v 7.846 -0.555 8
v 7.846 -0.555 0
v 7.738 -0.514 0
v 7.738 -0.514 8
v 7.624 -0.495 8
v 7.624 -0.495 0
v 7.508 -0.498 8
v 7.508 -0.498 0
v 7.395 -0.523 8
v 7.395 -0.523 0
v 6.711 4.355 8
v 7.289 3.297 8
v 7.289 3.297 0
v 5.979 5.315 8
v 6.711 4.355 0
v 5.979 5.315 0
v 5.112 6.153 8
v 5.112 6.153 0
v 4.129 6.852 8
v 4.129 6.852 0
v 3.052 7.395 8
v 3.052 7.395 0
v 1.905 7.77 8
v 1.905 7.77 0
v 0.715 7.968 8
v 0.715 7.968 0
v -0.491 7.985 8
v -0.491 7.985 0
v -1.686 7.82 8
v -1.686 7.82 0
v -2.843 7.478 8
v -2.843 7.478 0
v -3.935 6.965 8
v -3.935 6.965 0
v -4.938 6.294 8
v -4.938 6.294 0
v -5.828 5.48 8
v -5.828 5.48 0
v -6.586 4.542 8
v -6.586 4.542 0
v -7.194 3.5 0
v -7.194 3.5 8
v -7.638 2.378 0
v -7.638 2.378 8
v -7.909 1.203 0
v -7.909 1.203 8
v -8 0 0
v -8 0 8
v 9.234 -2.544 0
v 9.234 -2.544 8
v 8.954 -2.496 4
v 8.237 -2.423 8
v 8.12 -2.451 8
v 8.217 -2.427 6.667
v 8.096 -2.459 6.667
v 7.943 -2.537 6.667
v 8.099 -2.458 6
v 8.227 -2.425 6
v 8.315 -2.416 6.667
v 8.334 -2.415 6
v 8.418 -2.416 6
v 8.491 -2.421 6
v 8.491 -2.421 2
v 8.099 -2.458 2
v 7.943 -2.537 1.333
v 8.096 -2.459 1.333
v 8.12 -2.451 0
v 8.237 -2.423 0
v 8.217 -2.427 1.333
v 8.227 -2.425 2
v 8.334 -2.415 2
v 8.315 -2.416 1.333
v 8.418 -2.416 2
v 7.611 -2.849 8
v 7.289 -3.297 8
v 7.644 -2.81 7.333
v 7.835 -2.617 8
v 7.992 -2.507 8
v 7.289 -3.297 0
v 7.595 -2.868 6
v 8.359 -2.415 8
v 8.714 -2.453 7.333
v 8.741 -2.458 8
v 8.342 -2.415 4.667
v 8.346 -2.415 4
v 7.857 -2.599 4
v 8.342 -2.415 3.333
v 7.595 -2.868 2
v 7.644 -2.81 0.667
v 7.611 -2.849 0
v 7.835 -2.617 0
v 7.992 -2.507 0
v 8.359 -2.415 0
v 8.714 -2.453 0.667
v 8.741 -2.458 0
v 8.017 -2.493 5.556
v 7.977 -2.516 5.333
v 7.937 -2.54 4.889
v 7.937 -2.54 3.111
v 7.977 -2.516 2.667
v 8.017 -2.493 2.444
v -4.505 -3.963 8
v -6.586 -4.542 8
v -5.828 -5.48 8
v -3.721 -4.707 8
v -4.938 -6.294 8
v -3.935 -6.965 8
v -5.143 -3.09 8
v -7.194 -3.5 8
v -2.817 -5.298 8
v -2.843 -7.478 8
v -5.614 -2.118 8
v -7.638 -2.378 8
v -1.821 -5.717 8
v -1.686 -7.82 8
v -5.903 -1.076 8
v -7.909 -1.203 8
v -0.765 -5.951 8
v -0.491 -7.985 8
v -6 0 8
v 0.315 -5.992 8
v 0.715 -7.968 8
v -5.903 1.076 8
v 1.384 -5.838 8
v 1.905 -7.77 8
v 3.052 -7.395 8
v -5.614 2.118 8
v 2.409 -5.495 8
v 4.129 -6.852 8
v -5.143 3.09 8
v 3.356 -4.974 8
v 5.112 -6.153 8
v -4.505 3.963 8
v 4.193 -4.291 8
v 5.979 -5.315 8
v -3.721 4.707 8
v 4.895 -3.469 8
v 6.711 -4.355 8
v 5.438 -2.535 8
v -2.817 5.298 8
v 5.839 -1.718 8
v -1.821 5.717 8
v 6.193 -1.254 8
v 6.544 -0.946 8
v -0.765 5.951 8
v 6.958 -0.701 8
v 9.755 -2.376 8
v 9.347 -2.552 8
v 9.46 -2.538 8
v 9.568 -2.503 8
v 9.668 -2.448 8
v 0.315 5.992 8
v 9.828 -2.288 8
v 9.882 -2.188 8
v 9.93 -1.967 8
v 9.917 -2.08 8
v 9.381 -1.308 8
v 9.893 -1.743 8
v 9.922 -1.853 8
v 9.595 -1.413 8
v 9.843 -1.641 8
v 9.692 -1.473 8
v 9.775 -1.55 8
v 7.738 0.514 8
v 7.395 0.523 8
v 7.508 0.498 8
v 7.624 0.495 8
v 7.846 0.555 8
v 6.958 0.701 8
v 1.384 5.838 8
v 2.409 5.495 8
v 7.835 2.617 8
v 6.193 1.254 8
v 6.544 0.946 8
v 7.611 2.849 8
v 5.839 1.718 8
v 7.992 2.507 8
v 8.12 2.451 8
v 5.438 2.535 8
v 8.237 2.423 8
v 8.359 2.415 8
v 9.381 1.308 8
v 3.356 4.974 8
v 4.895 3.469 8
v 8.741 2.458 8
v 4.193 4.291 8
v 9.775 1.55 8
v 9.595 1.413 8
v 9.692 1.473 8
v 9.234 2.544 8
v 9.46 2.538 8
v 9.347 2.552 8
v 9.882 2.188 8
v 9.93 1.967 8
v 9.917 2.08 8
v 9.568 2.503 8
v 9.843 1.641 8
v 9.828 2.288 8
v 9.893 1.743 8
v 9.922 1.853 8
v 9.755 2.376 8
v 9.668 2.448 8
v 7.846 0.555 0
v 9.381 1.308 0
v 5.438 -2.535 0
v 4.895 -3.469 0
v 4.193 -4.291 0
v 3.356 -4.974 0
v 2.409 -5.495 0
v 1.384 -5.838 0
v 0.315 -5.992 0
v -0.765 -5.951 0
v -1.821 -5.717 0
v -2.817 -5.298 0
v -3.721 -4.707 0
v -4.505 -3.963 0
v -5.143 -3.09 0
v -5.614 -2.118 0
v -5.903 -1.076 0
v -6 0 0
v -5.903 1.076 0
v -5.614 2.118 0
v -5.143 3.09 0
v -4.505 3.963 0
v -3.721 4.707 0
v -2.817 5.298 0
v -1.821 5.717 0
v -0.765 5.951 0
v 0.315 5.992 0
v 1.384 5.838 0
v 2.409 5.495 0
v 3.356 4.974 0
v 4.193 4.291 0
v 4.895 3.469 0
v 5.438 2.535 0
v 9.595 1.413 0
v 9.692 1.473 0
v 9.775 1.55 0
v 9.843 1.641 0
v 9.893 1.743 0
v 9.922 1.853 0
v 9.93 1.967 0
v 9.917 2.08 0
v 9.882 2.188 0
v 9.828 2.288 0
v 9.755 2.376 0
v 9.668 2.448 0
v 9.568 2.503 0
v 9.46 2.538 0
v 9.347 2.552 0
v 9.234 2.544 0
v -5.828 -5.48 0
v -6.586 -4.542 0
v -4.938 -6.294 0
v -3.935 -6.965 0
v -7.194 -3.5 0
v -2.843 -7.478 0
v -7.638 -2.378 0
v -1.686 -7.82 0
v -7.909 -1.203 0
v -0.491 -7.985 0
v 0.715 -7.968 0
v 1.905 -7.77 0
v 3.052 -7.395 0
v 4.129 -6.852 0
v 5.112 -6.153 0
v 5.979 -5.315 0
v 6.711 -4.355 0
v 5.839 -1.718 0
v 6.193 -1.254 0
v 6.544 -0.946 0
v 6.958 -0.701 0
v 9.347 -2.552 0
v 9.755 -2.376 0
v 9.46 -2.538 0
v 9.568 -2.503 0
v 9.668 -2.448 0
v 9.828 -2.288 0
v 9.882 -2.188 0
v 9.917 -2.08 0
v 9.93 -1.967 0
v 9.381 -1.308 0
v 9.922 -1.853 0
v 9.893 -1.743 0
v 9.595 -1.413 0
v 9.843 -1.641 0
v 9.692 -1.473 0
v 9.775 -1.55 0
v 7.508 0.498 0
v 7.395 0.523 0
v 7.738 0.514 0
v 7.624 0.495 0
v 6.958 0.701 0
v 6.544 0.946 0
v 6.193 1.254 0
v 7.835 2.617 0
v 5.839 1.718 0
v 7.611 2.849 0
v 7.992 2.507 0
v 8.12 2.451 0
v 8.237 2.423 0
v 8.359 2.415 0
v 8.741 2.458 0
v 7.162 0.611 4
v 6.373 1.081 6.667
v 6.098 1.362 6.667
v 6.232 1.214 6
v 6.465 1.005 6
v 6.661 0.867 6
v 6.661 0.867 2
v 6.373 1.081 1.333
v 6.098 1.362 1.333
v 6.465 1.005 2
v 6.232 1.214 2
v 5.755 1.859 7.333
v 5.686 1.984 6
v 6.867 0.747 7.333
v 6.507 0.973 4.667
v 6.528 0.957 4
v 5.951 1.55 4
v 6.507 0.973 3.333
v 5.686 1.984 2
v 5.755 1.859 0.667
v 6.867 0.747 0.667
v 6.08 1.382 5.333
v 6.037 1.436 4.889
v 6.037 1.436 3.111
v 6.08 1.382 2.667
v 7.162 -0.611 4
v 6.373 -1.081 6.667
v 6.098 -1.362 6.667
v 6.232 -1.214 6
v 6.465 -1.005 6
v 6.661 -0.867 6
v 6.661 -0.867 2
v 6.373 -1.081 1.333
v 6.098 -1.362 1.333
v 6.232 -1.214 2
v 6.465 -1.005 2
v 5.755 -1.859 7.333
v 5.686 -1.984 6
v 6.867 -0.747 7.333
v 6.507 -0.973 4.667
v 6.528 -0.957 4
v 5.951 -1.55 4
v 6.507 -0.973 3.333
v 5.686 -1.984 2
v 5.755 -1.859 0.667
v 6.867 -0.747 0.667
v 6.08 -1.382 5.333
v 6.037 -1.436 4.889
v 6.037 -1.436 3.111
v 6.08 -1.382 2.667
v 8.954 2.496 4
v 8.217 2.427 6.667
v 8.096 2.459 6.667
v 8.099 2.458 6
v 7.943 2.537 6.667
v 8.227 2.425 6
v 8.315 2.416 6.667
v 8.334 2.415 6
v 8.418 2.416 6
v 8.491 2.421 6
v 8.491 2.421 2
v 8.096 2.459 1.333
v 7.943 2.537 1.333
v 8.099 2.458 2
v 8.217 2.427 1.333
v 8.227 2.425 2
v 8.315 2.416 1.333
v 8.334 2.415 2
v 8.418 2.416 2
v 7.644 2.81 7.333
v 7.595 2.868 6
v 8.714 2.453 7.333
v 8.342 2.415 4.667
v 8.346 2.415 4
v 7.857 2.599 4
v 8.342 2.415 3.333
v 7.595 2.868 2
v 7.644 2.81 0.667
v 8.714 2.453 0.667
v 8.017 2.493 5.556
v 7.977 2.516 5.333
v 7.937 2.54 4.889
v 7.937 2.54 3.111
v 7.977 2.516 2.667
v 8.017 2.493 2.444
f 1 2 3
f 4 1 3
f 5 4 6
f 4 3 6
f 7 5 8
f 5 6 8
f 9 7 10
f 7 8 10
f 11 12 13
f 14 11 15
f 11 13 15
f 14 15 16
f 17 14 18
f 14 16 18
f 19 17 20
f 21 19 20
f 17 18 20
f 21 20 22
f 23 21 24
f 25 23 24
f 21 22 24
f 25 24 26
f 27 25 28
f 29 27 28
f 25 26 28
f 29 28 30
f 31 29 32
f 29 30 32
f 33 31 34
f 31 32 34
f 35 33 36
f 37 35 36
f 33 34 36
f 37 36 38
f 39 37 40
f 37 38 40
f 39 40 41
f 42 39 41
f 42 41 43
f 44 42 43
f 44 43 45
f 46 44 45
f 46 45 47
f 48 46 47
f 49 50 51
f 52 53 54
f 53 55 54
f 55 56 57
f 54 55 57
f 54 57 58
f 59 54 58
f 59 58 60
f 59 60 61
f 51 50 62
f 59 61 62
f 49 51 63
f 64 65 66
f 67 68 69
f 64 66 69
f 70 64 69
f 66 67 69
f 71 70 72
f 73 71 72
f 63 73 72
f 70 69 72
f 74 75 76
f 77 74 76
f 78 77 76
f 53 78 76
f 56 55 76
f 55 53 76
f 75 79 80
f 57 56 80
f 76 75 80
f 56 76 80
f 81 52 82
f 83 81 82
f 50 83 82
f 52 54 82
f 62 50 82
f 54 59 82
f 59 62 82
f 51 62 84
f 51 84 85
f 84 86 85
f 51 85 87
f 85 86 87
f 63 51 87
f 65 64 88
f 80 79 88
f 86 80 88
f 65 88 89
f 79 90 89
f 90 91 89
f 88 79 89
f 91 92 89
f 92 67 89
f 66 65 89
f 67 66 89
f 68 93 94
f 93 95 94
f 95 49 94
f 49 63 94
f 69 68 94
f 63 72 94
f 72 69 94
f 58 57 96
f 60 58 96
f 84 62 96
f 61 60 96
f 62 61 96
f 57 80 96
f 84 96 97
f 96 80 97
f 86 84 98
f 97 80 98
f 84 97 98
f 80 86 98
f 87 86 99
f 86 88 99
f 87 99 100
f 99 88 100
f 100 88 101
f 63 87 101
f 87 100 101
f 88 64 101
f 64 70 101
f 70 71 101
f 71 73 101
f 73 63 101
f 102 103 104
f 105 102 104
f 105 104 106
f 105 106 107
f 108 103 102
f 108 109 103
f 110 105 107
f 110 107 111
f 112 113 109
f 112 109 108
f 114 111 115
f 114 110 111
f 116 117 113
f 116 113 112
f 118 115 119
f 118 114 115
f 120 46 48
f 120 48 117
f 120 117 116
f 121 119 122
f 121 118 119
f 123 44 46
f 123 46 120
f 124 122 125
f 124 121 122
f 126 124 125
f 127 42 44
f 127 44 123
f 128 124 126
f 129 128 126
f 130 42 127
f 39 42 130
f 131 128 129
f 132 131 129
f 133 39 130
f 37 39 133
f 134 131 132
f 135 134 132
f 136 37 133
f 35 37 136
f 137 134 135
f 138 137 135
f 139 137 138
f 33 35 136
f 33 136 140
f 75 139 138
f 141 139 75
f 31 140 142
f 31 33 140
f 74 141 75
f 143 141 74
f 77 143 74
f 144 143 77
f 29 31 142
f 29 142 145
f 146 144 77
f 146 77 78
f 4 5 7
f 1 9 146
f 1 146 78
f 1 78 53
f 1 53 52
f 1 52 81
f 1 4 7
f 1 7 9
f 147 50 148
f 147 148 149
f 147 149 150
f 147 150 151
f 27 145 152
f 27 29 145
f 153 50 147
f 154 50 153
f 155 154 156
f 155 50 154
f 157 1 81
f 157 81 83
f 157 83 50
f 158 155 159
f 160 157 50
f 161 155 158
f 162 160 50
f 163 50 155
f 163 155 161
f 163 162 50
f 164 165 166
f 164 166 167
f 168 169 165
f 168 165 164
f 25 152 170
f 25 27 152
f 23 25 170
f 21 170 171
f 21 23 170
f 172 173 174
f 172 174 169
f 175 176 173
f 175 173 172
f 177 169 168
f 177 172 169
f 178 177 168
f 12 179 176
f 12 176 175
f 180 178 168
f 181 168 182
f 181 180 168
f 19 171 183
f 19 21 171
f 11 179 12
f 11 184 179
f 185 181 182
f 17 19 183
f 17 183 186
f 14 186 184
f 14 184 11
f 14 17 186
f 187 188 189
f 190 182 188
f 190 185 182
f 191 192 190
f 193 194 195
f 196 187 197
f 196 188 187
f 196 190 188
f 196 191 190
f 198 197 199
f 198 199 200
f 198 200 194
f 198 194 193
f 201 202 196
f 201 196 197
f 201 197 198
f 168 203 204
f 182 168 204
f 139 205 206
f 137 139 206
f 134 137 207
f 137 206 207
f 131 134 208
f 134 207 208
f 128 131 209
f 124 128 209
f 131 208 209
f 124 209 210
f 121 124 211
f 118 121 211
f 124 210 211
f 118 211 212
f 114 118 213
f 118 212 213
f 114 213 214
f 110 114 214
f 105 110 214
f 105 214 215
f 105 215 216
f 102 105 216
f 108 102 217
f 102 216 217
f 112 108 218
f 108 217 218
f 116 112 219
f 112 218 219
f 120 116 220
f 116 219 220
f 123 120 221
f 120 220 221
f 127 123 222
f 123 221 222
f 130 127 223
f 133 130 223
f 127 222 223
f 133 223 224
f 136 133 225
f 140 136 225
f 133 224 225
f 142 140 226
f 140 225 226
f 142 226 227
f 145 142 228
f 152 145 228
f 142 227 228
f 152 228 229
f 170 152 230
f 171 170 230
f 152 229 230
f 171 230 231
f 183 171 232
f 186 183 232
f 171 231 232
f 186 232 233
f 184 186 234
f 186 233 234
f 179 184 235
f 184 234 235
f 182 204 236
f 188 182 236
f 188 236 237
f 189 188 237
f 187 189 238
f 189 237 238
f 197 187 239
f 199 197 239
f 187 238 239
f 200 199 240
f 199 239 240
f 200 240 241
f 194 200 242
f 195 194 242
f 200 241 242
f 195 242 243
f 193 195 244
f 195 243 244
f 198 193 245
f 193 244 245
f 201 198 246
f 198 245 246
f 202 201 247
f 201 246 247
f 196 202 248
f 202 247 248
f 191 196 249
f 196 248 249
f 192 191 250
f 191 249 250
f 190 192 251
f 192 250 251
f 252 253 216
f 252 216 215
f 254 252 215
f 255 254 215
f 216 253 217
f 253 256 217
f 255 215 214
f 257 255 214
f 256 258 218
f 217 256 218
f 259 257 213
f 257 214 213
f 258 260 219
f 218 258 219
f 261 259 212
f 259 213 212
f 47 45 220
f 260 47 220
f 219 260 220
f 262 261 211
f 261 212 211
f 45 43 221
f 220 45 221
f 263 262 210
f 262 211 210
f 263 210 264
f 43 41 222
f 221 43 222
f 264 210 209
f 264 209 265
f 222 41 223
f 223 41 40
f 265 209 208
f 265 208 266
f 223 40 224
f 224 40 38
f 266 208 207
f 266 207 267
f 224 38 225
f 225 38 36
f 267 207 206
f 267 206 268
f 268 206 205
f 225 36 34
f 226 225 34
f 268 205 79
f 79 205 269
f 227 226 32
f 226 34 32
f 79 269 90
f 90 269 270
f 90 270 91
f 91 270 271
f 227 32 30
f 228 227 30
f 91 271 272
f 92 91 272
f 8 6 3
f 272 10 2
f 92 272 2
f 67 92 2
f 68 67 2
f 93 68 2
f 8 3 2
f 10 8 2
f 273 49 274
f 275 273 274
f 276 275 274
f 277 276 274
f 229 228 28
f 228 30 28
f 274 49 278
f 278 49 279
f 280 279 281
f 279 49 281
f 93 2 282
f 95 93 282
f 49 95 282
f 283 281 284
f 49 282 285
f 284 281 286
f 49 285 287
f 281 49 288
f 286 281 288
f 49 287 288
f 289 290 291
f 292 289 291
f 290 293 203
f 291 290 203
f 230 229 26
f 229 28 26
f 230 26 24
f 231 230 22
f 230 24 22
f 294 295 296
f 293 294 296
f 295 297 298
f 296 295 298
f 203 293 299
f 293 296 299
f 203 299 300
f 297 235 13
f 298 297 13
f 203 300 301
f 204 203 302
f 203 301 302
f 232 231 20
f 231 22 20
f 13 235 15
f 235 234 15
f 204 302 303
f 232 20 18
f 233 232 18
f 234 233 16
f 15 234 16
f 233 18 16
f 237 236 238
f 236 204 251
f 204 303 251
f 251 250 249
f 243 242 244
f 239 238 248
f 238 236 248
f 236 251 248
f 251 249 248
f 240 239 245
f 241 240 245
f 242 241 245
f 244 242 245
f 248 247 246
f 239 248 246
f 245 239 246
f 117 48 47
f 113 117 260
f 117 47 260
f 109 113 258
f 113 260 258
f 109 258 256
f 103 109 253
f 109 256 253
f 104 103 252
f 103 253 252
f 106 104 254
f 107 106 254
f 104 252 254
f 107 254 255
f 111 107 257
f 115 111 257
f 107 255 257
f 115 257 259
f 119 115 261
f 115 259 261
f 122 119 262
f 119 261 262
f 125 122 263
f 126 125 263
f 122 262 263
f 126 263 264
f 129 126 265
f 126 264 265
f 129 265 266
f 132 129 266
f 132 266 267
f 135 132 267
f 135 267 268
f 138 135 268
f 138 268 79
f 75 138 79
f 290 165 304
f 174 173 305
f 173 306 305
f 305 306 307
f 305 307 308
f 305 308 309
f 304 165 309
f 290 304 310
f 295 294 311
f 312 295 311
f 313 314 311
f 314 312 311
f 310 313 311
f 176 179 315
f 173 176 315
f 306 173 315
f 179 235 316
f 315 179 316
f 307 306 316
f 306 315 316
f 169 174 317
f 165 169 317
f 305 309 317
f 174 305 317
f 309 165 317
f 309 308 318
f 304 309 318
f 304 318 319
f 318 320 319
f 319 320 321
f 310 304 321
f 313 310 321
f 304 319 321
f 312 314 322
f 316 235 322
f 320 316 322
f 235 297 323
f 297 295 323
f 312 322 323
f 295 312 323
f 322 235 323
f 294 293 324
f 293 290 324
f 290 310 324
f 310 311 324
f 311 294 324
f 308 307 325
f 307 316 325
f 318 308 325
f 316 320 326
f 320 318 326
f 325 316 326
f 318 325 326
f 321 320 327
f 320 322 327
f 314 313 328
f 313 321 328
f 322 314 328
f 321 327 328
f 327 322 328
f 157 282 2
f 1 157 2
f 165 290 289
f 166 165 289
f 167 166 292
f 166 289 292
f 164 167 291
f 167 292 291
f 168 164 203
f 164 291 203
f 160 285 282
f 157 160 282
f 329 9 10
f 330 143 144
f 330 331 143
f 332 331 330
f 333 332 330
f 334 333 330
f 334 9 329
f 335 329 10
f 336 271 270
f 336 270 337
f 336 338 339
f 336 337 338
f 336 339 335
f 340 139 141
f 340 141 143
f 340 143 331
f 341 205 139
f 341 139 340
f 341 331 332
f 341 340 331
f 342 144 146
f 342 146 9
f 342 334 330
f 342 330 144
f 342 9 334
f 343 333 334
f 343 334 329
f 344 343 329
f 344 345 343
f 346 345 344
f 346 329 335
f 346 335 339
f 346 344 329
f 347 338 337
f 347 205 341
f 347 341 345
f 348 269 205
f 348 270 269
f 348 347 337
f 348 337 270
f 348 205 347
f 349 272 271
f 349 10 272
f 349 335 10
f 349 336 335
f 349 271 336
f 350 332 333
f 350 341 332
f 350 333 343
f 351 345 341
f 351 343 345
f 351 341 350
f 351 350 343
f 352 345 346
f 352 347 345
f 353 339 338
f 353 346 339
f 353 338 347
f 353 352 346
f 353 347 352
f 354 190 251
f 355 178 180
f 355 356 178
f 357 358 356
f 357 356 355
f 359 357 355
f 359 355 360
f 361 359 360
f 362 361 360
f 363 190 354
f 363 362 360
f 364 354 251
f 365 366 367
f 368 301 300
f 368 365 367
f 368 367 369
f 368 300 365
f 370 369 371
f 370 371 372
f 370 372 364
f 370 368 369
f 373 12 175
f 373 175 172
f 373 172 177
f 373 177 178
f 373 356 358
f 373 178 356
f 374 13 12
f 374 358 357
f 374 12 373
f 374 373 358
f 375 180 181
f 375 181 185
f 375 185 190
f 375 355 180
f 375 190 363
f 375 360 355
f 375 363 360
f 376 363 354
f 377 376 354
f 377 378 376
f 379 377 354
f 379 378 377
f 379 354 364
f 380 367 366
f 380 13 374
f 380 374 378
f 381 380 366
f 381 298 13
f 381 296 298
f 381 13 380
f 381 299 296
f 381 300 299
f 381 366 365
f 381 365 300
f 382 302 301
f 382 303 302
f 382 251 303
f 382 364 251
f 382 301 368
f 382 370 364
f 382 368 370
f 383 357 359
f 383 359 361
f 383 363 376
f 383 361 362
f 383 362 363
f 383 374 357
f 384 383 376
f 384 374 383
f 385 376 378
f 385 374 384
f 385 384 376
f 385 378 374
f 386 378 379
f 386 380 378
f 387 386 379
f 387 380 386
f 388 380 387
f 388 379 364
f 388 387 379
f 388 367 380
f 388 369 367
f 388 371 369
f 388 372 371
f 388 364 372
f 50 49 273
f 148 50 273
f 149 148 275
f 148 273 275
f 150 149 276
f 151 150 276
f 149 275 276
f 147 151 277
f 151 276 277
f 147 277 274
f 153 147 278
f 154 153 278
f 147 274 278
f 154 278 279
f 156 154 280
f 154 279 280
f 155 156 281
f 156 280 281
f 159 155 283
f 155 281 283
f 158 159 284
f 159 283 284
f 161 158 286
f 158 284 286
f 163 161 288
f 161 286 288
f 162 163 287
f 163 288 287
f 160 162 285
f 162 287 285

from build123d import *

# Parameters (mm, degrees)
F1_DEPTH = 8


with BuildPart() as f1:
    # F0 (on Top) → F1 (new body)
    with BuildSketch(Plane.XY):
        with BuildLine():
            ThreePointArc((-6, 0), (-1.2982424862, 5.8578636419), (5.4381888157, 2.5349758194))
            add(Edge.make_bspline(
                [(5.4381888157, 2.5349758194), (5.9168648922, 1.3048778647), (6.5712223704, 0.8342077495), (7.316287914, 0.5489782253), (7.3954237393, 0.5231885691)],
                knots=[0, 0, 0, 0, 0.5130903697, 0.5729750339, 0.5729750339, 0.5729750339, 0.5729750339], degree=3))
            ThreePointArc((7.3954237393, 0.5231885691), (7.6236703696, 0.4951548346), (7.8456981312, 0.5550387858))
            Line((7.8456981312, 0.5550387858), (9.3807354753, 1.30845808))
            Line((9.3807354753, 1.30845808), (9.5947175059, 1.4134836619))
            ThreePointArc((9.5947175059, 1.4134836619), (9.9019177362, 2.1346293669), (9.2336132629, 2.544253878))
            add(Edge.make_bspline(
                [(7.2891862958, 3.2966290579), (7.9620901058, 2.2604630582), (8.2498794852, 2.3761286058), (9.1349400628, 2.5281333533), (9.2336132629, 2.544253878)],
                knots=[0, 0, 0, 0, 0.4310159689, 0.4819722472, 0.4819722472, 0.4819722472, 0.4819722472], degree=3))
            ThreePointArc((7.2891862958, 3.2966290579), (-1.6861953673, 7.8202778201), (-8, 0))
            ThreePointArc((-8, 0), (-1.6861953673, -7.8202778201), (7.2891862958, -3.2966290579))
            add(Edge.make_bspline(
                [(7.2891862958, -3.2966290579), (7.9620901058, -2.2604630582), (8.2498794852, -2.3761286058), (9.1349400628, -2.5281333533), (9.2336132629, -2.544253878)],
                knots=[0, 0, 0, 0, 0.4310159689, 0.4819722472, 0.4819722472, 0.4819722472, 0.4819722472], degree=3))
            ThreePointArc((9.2336132629, -2.544253878), (9.9019177362, -2.1346293669), (9.5947175059, -1.4134836619))
            Line((9.5947175059, -1.4134836619), (9.3807354753, -1.30845808))
            Line((9.3807354753, -1.30845808), (7.8456981312, -0.5550387858))
            ThreePointArc((7.8456981312, -0.5550387858), (7.6236703696, -0.4951548346), (7.3954237393, -0.5231885691))
            add(Edge.make_bspline(
                [(5.4381888157, -2.5349758194), (5.9168648922, -1.3048778647), (6.5712223704, -0.8342077495), (7.316287914, -0.5489782253), (7.3954237393, -0.5231885691)],
                knots=[0, 0, 0, 0, 0.5130903697, 0.5729750339, 0.5729750339, 0.5729750339, 0.5729750339], degree=3))
            ThreePointArc((5.4381888157, -2.5349758194), (-1.2982424862, -5.8578636419), (-6, 0))
        make_face()
    extrude(amount=F1_DEPTH)


solid = f1.part
